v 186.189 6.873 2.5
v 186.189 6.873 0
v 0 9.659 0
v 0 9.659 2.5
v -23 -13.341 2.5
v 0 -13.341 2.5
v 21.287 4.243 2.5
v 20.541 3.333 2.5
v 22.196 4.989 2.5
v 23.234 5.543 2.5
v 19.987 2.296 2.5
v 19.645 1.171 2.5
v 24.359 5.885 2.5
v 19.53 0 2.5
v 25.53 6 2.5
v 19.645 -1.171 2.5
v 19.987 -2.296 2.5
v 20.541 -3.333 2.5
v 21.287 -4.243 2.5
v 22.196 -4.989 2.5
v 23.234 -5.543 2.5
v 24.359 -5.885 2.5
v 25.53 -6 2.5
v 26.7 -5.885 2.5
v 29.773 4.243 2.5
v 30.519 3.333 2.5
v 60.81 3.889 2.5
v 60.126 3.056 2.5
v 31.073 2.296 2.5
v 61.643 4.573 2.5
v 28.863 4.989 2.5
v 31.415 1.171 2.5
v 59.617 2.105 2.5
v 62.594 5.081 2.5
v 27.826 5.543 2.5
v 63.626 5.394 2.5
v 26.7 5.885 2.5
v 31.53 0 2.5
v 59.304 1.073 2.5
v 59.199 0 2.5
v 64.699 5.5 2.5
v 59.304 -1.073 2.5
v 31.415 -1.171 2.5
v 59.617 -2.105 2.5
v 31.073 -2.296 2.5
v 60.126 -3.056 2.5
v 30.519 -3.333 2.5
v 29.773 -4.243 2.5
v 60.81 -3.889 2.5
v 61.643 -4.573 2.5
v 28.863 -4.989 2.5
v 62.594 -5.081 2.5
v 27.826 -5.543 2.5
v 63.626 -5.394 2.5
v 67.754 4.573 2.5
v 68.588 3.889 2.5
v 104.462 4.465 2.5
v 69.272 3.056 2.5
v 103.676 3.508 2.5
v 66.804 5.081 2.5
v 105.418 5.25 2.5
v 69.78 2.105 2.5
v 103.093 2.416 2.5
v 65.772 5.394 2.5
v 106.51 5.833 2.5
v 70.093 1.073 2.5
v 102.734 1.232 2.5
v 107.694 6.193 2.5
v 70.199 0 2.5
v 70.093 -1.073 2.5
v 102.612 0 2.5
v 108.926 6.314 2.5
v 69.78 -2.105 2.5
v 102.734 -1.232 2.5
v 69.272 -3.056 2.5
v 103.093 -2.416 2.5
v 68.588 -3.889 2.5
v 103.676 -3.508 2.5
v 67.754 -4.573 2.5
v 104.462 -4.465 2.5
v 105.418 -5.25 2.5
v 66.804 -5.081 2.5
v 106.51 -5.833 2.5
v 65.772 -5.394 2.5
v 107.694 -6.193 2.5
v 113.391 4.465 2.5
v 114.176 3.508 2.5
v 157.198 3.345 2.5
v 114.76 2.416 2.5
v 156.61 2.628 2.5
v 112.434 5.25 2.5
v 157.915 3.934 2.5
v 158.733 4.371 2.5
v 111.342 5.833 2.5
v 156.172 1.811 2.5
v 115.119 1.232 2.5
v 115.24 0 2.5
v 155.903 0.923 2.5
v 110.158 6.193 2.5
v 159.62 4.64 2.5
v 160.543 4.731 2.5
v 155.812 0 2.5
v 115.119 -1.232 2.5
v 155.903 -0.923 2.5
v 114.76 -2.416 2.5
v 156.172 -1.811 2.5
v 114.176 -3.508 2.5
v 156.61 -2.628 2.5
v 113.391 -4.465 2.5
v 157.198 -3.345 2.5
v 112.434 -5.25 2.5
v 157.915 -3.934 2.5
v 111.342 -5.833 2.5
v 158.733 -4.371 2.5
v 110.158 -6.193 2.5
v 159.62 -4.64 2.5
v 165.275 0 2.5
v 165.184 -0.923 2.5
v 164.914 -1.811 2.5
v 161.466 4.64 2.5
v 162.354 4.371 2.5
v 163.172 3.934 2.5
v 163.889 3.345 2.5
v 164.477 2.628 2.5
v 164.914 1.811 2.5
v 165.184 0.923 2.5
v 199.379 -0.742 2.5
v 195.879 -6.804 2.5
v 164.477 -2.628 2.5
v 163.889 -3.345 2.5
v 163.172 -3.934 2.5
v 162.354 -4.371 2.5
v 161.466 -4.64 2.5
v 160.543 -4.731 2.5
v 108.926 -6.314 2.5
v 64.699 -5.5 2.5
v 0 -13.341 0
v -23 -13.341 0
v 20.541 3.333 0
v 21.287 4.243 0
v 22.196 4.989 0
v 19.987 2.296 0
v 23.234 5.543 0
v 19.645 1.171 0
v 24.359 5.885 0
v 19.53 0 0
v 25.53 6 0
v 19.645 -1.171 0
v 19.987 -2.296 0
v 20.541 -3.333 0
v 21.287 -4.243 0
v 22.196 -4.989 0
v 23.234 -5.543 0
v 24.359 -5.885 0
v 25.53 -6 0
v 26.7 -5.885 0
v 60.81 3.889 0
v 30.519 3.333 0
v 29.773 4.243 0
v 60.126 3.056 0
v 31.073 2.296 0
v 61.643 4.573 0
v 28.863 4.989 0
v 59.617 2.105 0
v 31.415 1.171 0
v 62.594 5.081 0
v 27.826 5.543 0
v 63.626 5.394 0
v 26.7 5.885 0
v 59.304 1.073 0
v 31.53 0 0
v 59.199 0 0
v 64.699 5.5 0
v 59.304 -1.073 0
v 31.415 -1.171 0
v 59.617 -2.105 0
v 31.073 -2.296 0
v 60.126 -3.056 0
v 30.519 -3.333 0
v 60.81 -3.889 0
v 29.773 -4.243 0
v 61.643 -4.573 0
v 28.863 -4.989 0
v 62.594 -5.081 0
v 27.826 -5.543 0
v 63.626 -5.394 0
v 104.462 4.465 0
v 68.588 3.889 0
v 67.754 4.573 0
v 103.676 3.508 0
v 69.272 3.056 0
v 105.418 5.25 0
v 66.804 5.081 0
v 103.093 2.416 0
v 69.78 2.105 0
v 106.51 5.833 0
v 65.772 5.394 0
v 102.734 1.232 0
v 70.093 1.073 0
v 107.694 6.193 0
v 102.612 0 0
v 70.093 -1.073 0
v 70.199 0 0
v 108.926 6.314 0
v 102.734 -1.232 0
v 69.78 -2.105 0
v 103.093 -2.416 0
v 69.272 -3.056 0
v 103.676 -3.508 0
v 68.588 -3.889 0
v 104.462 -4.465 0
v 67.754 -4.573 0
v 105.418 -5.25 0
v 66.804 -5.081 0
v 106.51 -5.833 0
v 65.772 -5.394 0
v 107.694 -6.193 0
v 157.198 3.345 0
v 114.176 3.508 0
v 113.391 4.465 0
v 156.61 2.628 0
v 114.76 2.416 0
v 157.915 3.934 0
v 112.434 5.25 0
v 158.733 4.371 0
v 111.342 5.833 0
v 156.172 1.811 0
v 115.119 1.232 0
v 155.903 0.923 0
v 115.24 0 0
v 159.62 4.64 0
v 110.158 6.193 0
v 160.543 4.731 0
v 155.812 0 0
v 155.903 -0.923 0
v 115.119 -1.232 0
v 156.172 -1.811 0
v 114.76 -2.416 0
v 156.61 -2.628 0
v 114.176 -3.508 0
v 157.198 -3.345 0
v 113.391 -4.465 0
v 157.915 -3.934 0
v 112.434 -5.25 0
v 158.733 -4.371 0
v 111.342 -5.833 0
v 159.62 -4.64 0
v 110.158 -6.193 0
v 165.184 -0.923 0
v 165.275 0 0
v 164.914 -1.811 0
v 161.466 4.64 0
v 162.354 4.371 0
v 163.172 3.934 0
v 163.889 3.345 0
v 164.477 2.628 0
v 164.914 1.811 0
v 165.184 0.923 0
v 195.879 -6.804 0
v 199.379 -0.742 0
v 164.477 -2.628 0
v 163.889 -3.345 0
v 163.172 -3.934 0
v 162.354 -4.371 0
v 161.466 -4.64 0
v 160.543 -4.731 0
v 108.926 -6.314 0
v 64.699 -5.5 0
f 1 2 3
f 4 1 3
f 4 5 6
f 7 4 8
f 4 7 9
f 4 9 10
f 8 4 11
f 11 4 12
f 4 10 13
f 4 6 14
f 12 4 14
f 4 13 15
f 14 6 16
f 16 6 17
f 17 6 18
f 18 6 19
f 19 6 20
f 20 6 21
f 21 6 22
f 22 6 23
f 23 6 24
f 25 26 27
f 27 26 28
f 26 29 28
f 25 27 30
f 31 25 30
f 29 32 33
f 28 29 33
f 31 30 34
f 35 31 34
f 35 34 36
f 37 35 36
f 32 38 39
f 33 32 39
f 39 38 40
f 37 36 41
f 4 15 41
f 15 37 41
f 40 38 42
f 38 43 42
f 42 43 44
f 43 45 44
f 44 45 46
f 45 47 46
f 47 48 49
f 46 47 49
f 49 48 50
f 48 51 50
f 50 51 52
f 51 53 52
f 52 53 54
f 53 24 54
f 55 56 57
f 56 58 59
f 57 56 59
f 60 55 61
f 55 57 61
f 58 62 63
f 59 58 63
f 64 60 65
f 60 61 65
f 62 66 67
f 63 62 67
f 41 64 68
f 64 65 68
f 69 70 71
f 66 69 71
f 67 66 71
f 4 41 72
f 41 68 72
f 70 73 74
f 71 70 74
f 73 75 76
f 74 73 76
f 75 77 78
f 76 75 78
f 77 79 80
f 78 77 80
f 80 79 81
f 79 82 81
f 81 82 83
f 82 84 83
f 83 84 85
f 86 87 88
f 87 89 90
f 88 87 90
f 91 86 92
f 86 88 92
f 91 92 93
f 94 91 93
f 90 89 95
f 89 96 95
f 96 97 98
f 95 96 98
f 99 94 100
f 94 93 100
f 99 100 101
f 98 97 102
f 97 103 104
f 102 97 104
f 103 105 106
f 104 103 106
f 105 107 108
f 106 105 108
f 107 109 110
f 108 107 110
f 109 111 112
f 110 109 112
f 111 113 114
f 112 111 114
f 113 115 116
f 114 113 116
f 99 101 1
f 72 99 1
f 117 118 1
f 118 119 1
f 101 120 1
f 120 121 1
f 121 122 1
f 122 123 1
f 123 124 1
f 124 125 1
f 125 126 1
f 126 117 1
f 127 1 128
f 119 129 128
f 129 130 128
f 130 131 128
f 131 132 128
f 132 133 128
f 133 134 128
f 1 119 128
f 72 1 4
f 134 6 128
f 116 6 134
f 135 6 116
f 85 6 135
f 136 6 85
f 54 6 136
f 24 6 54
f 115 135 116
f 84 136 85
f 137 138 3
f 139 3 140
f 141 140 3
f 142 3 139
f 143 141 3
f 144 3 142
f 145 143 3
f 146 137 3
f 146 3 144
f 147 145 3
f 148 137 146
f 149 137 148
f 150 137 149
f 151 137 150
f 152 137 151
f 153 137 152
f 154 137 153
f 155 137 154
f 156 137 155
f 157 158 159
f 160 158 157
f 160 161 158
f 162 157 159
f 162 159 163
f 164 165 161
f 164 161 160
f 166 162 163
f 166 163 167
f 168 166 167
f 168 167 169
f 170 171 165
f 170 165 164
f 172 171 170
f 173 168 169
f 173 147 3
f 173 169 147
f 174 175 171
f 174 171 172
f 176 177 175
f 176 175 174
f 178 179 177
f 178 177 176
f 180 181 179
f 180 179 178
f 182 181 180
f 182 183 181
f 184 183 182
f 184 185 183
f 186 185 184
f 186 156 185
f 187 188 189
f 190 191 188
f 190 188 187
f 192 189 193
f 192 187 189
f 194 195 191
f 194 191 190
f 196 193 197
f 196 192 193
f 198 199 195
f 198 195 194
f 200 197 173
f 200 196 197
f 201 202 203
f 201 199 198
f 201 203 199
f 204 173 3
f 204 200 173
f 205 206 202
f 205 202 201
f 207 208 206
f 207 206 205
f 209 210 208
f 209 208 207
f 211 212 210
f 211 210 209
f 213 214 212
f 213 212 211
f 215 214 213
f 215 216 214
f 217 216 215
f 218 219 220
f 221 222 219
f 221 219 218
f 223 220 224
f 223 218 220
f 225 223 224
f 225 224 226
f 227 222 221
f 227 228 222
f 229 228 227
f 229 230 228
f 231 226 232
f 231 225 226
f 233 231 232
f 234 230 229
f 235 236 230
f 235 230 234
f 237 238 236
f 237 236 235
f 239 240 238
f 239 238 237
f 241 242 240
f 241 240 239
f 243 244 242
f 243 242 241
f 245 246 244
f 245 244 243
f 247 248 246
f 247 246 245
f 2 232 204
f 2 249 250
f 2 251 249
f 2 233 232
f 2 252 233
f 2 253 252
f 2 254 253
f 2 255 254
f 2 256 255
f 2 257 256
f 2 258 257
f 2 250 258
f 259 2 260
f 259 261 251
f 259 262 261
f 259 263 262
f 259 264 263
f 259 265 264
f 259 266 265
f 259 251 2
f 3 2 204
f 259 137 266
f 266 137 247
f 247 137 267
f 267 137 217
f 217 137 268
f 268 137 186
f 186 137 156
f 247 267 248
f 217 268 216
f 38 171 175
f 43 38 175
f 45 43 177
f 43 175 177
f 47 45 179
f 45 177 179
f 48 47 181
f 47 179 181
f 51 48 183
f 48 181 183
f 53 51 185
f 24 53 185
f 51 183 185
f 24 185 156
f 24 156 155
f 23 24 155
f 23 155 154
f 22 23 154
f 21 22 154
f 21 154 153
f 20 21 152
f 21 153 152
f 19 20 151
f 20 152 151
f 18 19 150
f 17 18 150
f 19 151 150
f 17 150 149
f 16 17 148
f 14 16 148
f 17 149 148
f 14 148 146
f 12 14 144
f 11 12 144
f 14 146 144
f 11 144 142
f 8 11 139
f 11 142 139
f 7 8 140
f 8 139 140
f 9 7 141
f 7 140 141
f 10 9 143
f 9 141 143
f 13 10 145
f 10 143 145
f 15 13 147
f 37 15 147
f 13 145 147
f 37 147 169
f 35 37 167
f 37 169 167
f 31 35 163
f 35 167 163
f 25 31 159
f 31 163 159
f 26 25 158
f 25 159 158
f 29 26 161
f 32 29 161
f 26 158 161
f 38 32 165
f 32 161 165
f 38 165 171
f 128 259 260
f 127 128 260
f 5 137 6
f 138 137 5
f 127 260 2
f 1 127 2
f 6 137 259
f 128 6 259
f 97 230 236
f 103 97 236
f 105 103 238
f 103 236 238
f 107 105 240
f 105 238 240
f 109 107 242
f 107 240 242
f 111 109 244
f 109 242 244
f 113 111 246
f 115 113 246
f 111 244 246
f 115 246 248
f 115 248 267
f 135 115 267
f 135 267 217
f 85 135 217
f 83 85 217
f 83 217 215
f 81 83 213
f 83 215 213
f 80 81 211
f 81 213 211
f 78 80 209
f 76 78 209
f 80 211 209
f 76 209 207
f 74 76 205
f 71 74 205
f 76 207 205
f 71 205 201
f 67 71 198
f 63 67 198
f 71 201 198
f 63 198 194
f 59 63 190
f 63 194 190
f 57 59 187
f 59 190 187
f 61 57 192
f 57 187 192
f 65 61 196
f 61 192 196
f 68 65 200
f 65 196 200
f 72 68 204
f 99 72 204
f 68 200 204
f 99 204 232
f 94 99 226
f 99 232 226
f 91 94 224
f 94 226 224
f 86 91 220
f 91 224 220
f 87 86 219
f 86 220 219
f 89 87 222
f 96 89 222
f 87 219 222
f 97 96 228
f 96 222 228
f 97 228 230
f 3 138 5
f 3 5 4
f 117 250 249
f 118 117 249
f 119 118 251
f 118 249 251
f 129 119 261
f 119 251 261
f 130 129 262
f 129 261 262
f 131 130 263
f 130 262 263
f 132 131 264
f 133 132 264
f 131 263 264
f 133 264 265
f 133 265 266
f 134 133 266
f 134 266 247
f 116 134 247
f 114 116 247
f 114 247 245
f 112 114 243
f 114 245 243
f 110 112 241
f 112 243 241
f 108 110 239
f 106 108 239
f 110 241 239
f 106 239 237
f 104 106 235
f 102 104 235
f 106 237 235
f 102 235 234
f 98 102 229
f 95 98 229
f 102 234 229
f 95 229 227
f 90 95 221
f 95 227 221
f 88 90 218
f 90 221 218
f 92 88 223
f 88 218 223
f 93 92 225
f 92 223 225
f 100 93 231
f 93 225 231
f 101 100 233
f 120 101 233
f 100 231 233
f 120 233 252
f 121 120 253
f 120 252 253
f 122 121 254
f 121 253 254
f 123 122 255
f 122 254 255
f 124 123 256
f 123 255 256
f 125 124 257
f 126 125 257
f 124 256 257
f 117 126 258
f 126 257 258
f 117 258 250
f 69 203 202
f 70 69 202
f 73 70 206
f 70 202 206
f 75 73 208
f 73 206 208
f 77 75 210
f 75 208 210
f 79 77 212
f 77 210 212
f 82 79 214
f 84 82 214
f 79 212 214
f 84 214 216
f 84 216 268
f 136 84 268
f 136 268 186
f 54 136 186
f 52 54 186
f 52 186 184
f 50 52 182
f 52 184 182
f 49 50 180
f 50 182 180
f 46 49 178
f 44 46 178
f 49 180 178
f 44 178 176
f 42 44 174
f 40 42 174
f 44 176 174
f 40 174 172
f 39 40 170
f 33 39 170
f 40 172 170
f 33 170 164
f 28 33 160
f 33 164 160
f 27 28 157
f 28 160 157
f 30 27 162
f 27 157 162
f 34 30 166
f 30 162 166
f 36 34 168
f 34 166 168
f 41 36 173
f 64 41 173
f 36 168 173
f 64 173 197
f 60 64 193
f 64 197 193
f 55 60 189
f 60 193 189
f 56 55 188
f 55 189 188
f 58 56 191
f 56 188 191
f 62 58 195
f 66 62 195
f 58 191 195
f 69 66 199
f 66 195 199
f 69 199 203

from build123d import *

# Parameters (mm, degrees)
F1_DEPTH = 2.5
F3_DEPTH = 25
F5_DEPTH = 25
F7_DEPTH = 25
F9_DEPTH = 2.5


with BuildPart() as f1:
    # F0 (on Top) → F1 (new body)
    with BuildSketch(Plane.XY):
        with BuildLine():
            ThreePointArc((155.8122909032, 0), (160.5434517066, 4.7311608034), (165.27461251, 0))
            Line((165.27461251, 0), (200, 0))
            Line((200, 0), (200, 6.6666666667))
            Line((200, 6.6666666667), (0, 9.6592448227))
            Line((0, 9.6592448227), (0, 0))
            Line((0, 0), (19.529893736, 0))
            ThreePointArc((19.529893736, 0), (25.529893736, 6), (31.529893736, 0))
            Line((31.529893736, 0), (59.1987557411, 0))
            ThreePointArc((59.1987557411, 0), (64.6987557411, 5.5), (70.1987557411, 0))
            Line((70.1987557411, 0), (102.6123418173, 0))
            ThreePointArc((102.6123418173, 0), (108.9262366295, 6.3138948122), (115.2401314417, 0))
            Line((115.2401314417, 0), (155.8122909032, 0))
        make_face()
        with BuildLine():
            Line((200, 0), (165.27461251, 0))
            ThreePointArc((165.27461251, 0), (160.5434517066, -4.7311608034), (155.8122909032, 0))
            Line((155.8122909032, 0), (115.2401314417, 0))
            ThreePointArc((115.2401314417, 0), (108.9262366295, -6.3138948122), (102.6123418173, 0))
            Line((102.6123418173, 0), (70.1987557411, 0))
            ThreePointArc((70.1987557411, 0), (64.6987557411, -5.5), (59.1987557411, 0))
            Line((59.1987557411, 0), (31.529893736, 0))
            ThreePointArc((31.529893736, 0), (25.529893736, -6), (19.529893736, 0))
            Line((19.529893736, 0), (0, 0))
            Line((0, 0), (0, -13.3407551773))
            Line((0, -13.3407551773), (200, -6.6666666667))
            Line((200, -6.6666666667), (200, 0))
        make_face()
    extrude(amount=F1_DEPTH)

    # F2 (on face) → F3 (cut)
    with BuildSketch(Plane.XY.offset(2.5)):
        Polygon((188.7384860036, 6.8351714706), (200, 0.3333333333), (200, 6.6666666667), align=None)
    extrude(amount=-F3_DEPTH, mode=Mode.SUBTRACT)

    # F4 (on face) → F5 (cut)
    with BuildSketch(Plane(origin=(0, 0, 0), x_dir=(1, 0, 0), z_dir=(0, 0, -1))):
        Polygon((195.8791541104, 6.8041811177), (200, -0.3333333333), (200, 6.6666666667), align=None)
    extrude(amount=-F5_DEPTH, mode=Mode.SUBTRACT)

    # F6 (on face) → F7 (cut)
    with BuildSketch(Plane(origin=(0, 0, 0), x_dir=(1, 0, 0), z_dir=(0, 0, -1))):
        Polygon((200, -0.3333333333), (199.3791541104, 0.7420032912), (186.1890294883, -6.87331871), (188.7384860036, -6.8351714706), align=None)
    extrude(amount=-F7_DEPTH, mode=Mode.SUBTRACT)

    # F8 (on face) → F9 (join)
    with BuildSketch(Plane(origin=(0, 0, 0), x_dir=(1, 0, 0), z_dir=(0, 0, -1))):
        Polygon((0, -9.6592448227), (0, 13.3407551773), (-23, 13.3407551773), align=None)
    extrude(amount=-F9_DEPTH)


solid = f1.part
